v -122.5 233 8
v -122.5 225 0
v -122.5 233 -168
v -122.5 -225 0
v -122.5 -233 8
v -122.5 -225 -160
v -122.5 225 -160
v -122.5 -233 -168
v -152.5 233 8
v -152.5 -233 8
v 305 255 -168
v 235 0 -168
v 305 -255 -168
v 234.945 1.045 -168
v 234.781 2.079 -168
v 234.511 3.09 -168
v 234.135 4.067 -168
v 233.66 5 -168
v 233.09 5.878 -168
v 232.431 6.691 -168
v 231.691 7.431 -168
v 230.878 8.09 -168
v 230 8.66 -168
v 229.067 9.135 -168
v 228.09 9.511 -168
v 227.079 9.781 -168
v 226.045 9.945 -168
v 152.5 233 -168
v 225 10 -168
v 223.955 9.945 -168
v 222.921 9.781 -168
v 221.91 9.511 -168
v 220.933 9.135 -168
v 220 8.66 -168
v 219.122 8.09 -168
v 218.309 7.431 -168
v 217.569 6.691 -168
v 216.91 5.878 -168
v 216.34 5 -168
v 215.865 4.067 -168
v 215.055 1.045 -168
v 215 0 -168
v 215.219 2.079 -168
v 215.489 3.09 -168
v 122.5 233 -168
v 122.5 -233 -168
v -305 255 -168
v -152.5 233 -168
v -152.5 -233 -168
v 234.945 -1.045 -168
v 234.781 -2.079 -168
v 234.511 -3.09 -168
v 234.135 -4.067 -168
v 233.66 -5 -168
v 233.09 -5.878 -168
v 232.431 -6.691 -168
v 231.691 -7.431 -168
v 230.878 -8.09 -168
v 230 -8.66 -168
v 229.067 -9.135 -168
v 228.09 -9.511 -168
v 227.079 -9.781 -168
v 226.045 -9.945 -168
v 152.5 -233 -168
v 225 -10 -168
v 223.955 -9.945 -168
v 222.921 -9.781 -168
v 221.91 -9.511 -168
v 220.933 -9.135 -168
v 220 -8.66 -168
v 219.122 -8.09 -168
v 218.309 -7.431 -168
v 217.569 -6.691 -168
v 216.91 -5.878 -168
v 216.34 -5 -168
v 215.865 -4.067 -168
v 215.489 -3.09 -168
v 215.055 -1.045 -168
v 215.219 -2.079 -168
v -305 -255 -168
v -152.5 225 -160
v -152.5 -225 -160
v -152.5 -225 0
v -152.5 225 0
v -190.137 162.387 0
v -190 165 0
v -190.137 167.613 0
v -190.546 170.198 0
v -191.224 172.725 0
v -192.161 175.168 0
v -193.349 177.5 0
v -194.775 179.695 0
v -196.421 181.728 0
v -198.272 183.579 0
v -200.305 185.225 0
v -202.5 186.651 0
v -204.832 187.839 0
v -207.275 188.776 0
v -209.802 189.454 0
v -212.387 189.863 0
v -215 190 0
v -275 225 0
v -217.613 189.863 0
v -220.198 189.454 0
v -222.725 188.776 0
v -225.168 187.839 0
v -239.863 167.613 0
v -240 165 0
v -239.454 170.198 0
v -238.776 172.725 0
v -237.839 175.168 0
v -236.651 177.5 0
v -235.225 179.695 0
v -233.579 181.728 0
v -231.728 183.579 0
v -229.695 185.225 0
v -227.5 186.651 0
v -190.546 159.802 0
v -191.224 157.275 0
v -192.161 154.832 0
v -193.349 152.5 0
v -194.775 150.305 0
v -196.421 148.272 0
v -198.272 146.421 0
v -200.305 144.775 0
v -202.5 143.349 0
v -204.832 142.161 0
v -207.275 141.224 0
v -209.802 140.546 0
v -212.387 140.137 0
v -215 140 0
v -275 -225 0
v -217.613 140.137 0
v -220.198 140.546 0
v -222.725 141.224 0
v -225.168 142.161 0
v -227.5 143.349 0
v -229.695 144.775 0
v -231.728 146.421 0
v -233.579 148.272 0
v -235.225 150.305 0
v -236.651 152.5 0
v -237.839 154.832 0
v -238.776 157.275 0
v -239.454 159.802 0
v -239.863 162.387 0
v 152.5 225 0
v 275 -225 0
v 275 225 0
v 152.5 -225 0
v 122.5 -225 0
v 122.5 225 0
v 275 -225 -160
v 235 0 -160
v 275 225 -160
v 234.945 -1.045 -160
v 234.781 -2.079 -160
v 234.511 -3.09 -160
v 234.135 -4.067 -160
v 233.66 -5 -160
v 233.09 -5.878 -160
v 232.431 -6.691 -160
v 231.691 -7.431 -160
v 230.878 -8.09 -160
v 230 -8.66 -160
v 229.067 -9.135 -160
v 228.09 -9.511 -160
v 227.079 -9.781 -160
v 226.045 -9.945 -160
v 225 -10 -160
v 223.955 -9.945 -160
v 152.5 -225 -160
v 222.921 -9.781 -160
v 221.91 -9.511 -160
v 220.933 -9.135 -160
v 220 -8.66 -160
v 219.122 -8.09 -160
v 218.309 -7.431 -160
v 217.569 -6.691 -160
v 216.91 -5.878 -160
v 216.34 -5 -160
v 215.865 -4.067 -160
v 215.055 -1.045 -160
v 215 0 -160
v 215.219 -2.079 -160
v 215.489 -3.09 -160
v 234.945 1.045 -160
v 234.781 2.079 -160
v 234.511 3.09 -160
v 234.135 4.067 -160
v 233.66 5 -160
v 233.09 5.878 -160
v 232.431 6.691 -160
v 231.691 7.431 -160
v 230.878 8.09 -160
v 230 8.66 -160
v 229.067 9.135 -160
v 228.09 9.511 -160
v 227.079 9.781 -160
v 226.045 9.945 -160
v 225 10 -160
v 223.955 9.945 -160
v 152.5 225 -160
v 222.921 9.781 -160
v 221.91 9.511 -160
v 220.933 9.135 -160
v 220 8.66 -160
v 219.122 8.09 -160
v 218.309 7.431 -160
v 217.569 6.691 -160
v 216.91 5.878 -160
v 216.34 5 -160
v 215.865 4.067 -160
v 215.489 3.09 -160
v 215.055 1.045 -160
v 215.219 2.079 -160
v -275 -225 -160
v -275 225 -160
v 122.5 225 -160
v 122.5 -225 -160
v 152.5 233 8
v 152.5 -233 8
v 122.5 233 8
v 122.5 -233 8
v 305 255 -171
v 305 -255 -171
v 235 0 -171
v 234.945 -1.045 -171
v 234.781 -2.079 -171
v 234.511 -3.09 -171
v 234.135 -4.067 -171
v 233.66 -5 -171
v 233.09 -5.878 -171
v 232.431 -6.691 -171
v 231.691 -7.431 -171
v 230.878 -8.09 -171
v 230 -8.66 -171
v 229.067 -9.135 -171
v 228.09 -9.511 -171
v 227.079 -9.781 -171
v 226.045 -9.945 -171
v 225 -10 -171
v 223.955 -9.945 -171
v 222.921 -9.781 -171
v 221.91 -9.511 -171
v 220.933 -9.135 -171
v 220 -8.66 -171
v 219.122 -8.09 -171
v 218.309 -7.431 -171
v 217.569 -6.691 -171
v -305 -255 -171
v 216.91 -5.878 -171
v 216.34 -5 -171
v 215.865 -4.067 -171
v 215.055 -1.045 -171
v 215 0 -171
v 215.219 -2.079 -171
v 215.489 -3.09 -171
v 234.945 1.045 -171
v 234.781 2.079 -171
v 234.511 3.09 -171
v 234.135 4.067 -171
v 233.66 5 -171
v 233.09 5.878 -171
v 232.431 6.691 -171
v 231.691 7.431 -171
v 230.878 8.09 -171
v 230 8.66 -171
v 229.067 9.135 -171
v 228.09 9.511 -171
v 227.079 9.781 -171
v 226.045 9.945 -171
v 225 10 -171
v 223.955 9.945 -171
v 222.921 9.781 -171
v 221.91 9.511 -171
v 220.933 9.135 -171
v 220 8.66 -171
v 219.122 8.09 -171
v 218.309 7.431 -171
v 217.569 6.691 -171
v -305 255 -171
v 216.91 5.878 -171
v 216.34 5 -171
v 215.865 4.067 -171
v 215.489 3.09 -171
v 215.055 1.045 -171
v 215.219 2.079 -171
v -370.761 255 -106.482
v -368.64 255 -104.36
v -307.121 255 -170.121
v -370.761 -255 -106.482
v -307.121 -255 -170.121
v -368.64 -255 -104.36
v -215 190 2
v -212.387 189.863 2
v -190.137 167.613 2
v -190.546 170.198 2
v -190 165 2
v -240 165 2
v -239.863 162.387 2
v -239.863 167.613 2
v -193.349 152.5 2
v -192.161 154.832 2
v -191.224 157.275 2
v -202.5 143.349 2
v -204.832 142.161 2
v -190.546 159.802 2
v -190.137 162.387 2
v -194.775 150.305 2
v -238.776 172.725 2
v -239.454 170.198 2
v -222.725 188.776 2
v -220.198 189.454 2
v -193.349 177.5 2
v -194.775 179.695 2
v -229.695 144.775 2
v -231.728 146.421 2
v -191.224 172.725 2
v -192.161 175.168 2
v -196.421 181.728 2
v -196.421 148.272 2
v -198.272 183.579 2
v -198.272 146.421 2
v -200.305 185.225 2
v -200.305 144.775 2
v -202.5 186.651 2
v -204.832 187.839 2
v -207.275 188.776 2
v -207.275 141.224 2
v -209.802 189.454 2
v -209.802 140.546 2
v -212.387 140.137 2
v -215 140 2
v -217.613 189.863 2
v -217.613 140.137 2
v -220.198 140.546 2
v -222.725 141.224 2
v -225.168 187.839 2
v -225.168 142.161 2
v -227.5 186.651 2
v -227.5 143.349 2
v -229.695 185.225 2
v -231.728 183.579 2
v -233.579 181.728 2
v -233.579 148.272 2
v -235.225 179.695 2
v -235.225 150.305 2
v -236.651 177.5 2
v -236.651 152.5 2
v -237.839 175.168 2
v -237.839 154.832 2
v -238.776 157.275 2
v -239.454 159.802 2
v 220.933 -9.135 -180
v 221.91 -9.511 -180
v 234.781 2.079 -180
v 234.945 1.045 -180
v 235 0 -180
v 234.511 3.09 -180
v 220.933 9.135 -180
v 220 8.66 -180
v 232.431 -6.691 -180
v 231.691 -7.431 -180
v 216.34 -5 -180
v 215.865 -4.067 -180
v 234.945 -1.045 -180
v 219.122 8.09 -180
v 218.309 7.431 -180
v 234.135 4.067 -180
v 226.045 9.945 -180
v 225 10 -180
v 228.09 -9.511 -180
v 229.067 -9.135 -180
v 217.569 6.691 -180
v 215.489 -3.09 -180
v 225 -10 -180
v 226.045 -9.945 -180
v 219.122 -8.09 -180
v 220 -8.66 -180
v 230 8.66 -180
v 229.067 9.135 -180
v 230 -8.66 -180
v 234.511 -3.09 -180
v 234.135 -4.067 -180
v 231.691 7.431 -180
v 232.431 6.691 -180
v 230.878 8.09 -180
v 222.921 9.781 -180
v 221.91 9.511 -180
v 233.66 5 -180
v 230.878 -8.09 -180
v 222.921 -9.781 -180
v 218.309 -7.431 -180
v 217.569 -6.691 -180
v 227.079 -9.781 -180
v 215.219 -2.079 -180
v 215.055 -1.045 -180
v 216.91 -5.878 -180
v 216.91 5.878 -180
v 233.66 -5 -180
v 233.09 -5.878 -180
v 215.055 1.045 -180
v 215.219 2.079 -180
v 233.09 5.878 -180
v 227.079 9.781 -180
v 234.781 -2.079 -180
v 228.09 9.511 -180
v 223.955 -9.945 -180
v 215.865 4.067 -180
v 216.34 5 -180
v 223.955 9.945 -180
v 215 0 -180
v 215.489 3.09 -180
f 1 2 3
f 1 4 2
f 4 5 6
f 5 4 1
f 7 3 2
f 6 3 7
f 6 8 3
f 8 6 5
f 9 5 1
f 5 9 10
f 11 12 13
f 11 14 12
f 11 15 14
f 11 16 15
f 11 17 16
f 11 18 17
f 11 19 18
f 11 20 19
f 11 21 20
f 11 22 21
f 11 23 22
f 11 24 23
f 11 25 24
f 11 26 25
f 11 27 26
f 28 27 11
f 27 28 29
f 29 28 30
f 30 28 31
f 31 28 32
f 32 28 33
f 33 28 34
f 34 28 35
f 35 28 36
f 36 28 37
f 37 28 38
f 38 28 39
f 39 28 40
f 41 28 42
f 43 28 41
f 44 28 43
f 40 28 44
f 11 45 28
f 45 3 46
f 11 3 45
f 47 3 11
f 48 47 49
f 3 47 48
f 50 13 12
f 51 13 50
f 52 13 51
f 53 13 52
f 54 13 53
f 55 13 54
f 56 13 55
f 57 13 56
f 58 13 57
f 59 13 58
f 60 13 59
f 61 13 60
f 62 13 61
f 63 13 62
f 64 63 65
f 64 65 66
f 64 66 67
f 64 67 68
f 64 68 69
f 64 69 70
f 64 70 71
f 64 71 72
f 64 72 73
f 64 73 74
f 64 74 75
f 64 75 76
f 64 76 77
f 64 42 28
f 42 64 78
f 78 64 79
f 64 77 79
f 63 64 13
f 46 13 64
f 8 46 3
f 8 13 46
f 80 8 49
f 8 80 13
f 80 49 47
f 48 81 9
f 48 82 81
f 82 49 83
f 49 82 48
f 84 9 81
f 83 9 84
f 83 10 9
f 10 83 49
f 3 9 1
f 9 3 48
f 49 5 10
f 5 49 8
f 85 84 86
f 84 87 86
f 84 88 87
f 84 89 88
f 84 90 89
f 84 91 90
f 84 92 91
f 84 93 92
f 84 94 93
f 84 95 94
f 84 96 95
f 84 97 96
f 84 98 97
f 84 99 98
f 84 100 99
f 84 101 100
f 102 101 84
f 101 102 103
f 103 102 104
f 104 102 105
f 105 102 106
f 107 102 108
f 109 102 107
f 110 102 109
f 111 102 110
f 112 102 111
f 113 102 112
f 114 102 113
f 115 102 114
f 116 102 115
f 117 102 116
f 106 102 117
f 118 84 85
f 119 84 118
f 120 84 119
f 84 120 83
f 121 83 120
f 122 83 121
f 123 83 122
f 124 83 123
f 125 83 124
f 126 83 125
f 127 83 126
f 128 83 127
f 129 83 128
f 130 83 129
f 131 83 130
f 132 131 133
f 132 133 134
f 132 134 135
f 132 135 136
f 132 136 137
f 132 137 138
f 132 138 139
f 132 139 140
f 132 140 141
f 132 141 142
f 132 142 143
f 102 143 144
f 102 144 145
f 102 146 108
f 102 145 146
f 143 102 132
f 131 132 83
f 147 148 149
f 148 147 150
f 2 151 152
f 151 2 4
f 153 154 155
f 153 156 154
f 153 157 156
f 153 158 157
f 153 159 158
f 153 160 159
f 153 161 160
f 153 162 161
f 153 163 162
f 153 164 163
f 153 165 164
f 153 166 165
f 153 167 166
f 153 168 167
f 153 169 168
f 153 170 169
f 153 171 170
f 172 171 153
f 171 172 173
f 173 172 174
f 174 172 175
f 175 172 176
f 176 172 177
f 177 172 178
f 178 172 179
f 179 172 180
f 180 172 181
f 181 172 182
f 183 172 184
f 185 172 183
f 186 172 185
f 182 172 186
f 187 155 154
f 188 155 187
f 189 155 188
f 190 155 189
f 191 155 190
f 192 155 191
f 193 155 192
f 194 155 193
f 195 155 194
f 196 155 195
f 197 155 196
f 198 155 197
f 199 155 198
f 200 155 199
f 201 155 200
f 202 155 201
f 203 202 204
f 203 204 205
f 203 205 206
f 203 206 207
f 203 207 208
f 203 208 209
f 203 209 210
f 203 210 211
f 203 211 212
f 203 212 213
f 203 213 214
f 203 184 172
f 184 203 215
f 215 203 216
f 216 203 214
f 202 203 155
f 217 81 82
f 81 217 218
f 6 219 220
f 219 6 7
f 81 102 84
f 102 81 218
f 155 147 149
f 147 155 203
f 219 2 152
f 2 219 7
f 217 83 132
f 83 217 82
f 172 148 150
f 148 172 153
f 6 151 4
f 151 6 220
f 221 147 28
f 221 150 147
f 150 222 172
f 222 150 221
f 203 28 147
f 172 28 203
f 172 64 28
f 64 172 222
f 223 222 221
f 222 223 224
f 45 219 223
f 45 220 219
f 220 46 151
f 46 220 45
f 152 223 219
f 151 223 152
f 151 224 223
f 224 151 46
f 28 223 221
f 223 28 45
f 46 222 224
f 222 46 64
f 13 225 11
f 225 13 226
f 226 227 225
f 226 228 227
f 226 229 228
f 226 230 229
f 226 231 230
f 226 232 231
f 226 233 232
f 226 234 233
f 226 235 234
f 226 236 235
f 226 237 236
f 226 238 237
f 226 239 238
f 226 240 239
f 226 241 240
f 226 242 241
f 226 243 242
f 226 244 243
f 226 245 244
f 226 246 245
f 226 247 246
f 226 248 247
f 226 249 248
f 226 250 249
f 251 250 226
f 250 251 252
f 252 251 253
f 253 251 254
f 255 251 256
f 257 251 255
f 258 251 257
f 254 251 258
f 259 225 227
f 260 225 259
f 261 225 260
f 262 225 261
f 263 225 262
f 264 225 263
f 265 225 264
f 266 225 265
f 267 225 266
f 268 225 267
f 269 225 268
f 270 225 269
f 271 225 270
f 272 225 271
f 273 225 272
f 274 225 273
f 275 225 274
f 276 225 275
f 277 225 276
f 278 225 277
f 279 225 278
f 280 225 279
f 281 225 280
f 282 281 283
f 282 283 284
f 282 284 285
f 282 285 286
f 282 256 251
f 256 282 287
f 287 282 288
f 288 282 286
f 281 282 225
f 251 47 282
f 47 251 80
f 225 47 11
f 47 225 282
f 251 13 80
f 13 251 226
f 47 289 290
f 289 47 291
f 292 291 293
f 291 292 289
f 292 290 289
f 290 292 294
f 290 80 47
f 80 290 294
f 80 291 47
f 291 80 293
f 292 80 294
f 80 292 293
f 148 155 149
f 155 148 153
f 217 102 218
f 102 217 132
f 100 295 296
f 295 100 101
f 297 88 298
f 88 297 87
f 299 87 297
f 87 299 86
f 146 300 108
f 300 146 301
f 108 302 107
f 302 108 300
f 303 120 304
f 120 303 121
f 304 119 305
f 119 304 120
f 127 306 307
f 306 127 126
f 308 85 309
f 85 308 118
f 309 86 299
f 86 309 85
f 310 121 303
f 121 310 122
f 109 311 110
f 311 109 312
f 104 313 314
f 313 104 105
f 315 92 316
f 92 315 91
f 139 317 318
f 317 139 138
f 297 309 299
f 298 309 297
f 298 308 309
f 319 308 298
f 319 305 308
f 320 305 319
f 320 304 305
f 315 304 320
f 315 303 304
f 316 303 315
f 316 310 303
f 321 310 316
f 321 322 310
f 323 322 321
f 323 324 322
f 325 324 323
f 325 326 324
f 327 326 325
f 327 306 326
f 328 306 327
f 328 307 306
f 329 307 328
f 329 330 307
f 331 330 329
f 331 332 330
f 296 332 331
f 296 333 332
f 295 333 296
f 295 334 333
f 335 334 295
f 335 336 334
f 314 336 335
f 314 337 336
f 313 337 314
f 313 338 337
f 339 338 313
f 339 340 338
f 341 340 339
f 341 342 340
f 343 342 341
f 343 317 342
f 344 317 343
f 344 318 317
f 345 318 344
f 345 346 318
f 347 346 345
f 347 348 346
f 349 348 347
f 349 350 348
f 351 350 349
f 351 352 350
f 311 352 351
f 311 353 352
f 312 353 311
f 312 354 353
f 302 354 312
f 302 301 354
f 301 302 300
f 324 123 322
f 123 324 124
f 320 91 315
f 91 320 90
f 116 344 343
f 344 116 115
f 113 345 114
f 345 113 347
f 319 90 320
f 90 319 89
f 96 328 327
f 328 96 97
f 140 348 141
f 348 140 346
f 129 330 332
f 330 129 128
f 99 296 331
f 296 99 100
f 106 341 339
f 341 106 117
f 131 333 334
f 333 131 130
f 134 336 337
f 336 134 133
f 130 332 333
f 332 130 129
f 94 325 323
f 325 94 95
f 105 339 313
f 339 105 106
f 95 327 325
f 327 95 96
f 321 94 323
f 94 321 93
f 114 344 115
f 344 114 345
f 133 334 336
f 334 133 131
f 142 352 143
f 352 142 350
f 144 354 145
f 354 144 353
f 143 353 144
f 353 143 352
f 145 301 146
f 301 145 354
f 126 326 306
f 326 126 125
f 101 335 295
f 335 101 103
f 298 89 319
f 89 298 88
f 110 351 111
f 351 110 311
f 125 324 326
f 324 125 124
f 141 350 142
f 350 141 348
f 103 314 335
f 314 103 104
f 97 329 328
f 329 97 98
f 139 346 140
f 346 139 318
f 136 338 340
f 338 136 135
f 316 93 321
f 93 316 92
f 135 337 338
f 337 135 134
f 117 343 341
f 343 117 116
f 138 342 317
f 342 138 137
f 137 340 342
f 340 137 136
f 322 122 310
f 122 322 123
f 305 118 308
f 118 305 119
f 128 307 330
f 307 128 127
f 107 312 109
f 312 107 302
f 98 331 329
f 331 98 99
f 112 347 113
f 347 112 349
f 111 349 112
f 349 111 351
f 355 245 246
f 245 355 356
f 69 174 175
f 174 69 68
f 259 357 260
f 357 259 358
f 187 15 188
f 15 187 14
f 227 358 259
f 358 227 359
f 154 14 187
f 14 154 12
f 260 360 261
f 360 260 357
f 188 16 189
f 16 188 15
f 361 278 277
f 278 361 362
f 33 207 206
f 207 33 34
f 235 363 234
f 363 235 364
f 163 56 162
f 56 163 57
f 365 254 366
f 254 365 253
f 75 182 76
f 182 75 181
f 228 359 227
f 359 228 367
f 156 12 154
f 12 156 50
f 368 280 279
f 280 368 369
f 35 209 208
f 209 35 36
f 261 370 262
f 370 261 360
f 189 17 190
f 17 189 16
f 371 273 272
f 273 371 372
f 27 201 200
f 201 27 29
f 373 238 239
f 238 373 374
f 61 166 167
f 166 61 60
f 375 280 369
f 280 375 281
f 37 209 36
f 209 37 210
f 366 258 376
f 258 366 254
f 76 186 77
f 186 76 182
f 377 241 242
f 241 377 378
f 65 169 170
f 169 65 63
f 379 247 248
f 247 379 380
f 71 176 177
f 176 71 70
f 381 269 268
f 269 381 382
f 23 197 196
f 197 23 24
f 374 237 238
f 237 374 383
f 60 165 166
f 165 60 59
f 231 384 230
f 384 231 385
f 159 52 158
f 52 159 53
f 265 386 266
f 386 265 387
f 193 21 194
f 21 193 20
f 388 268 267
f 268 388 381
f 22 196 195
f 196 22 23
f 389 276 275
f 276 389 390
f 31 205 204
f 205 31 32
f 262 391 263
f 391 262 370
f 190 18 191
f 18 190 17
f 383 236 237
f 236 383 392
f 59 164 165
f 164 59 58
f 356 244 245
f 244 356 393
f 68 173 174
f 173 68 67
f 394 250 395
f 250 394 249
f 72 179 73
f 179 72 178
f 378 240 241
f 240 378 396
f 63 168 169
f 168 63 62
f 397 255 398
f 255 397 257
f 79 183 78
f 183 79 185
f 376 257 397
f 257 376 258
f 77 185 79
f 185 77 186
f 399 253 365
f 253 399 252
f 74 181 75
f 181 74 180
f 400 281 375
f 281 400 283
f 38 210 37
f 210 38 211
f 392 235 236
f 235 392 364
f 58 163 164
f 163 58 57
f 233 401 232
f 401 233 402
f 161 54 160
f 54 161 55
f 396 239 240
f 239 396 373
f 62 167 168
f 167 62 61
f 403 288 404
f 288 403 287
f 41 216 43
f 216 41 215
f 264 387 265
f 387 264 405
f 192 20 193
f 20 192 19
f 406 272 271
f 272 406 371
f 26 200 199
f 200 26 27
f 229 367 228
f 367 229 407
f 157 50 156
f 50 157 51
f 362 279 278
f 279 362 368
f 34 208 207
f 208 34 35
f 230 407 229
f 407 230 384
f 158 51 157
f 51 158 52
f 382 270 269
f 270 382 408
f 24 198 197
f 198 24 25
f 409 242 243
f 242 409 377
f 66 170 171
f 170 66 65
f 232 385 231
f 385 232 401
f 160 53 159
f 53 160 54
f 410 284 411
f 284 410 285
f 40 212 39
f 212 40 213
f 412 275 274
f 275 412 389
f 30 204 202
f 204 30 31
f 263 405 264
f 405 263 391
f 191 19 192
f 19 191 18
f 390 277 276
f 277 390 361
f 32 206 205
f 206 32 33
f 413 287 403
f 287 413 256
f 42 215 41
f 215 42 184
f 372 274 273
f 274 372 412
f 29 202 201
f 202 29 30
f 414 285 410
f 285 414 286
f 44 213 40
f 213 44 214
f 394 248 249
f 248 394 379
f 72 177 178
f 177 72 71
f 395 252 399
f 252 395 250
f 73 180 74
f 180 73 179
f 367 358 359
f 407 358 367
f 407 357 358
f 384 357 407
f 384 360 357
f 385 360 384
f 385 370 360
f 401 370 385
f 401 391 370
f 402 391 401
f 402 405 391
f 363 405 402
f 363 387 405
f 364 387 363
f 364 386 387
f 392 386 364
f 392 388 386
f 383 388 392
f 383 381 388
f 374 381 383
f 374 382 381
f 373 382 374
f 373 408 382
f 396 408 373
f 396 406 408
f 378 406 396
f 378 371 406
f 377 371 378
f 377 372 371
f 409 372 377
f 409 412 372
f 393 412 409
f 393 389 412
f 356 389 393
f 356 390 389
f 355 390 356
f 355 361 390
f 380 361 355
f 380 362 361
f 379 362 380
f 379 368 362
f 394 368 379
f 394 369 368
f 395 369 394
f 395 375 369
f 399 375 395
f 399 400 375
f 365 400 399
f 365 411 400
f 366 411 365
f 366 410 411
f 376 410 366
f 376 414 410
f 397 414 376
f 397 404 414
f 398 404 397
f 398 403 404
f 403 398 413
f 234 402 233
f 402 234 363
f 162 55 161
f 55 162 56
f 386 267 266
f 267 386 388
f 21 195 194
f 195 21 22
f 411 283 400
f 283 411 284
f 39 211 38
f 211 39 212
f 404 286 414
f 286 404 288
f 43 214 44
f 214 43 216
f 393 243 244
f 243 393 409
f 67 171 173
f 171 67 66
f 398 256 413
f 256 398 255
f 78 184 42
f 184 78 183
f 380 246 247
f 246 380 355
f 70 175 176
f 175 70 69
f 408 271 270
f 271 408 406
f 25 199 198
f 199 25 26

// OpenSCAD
/*
 * Offroad Adventure Trailer - Water Tank + Skid Plate
 *
 * 40 L food-grade tank (550x450x160 = 39.6 L gross, baffled), slung under
 * the frame just ahead of the axle TUBE and offset LEFT of the central
 * drawbar (which owns y 575-625 under the frame). Two steel straps carry
 * the tank; a 3 mm aluminum tread skid plate with a beveled leading edge
 * protects it from rocks and stumps.
 *
 * LOW-PROFILE ON PURPOSE: with the frame underside ~577 mm above ground,
 * a 220 mm-deep tank hung down to ~336 mm clearance and was the lowest
 * point of the whole trailer. At 160 mm depth the skid plate sits at
 * ~405 mm — roughly level with the axle tube (~437 mm), so the chassis
 * line stays clean and the wheels/axle meet obstacles first.
 *
 * Origin = center of the tank footprint, Z=0 at the frame underside
 * (tank hangs in -Z).
 */

tank_l = 550;      // along X (travel direction)
tank_w = 450;      // along Y
tank_h = 160;      // shallow: protection > packaging (see note above)
skid_t = 3;
skid_margin = 30;  // skid plate extends past the tank
strap_w = 30;

$fn = 60;

module water_tank_assembly() {
    // Tank
    color("SteelBlue", 0.9)
        translate([-tank_l/2, -tank_w/2, -tank_h])
            cube([tank_l, tank_w, tank_h]);

    // Filler neck (up toward the external filler in the wall)
    color("SteelBlue")
        translate([-tank_l/2 + 60, tank_w/2 - 60, -10])
            cylinder(d=50, h=12);

    // Drain valve at the low point (winterization requirement)
    color("goldenrod")
        translate([tank_l/2 - 50, 0, -tank_h - 20])
            cylinder(d=20, h=25);

    // Two carrying straps (rectangular rings around tank + skid)
    color("dimgray")
        for (x = [-tank_l/4, tank_l/4])
            translate([x, 0, -tank_h/2])
                difference() {
                    cube([strap_w, tank_w + 16, tank_h + 16], center=true);
                    cube([strap_w + 2, tank_w, tank_h], center=true);
                }

    // Skid plate (3 mm aluminum tread)
    color("silver") {
        translate([-tank_l/2 - skid_margin, -tank_w/2 - skid_margin, -tank_h - 8 - skid_t])
            cube([tank_l + 2*skid_margin, tank_w + 2*skid_margin, skid_t]);
        // Beveled leading edge (deflects rocks, ~45 degrees up toward the front)
        translate([-tank_l/2 - skid_margin, -tank_w/2 - skid_margin, -tank_h - 8])
            rotate([0, -135, 0])
                cube([90, tank_w + 2*skid_margin, skid_t]);
    }
}

// Renders if the file is opened standalone
water_tank_assembly();
